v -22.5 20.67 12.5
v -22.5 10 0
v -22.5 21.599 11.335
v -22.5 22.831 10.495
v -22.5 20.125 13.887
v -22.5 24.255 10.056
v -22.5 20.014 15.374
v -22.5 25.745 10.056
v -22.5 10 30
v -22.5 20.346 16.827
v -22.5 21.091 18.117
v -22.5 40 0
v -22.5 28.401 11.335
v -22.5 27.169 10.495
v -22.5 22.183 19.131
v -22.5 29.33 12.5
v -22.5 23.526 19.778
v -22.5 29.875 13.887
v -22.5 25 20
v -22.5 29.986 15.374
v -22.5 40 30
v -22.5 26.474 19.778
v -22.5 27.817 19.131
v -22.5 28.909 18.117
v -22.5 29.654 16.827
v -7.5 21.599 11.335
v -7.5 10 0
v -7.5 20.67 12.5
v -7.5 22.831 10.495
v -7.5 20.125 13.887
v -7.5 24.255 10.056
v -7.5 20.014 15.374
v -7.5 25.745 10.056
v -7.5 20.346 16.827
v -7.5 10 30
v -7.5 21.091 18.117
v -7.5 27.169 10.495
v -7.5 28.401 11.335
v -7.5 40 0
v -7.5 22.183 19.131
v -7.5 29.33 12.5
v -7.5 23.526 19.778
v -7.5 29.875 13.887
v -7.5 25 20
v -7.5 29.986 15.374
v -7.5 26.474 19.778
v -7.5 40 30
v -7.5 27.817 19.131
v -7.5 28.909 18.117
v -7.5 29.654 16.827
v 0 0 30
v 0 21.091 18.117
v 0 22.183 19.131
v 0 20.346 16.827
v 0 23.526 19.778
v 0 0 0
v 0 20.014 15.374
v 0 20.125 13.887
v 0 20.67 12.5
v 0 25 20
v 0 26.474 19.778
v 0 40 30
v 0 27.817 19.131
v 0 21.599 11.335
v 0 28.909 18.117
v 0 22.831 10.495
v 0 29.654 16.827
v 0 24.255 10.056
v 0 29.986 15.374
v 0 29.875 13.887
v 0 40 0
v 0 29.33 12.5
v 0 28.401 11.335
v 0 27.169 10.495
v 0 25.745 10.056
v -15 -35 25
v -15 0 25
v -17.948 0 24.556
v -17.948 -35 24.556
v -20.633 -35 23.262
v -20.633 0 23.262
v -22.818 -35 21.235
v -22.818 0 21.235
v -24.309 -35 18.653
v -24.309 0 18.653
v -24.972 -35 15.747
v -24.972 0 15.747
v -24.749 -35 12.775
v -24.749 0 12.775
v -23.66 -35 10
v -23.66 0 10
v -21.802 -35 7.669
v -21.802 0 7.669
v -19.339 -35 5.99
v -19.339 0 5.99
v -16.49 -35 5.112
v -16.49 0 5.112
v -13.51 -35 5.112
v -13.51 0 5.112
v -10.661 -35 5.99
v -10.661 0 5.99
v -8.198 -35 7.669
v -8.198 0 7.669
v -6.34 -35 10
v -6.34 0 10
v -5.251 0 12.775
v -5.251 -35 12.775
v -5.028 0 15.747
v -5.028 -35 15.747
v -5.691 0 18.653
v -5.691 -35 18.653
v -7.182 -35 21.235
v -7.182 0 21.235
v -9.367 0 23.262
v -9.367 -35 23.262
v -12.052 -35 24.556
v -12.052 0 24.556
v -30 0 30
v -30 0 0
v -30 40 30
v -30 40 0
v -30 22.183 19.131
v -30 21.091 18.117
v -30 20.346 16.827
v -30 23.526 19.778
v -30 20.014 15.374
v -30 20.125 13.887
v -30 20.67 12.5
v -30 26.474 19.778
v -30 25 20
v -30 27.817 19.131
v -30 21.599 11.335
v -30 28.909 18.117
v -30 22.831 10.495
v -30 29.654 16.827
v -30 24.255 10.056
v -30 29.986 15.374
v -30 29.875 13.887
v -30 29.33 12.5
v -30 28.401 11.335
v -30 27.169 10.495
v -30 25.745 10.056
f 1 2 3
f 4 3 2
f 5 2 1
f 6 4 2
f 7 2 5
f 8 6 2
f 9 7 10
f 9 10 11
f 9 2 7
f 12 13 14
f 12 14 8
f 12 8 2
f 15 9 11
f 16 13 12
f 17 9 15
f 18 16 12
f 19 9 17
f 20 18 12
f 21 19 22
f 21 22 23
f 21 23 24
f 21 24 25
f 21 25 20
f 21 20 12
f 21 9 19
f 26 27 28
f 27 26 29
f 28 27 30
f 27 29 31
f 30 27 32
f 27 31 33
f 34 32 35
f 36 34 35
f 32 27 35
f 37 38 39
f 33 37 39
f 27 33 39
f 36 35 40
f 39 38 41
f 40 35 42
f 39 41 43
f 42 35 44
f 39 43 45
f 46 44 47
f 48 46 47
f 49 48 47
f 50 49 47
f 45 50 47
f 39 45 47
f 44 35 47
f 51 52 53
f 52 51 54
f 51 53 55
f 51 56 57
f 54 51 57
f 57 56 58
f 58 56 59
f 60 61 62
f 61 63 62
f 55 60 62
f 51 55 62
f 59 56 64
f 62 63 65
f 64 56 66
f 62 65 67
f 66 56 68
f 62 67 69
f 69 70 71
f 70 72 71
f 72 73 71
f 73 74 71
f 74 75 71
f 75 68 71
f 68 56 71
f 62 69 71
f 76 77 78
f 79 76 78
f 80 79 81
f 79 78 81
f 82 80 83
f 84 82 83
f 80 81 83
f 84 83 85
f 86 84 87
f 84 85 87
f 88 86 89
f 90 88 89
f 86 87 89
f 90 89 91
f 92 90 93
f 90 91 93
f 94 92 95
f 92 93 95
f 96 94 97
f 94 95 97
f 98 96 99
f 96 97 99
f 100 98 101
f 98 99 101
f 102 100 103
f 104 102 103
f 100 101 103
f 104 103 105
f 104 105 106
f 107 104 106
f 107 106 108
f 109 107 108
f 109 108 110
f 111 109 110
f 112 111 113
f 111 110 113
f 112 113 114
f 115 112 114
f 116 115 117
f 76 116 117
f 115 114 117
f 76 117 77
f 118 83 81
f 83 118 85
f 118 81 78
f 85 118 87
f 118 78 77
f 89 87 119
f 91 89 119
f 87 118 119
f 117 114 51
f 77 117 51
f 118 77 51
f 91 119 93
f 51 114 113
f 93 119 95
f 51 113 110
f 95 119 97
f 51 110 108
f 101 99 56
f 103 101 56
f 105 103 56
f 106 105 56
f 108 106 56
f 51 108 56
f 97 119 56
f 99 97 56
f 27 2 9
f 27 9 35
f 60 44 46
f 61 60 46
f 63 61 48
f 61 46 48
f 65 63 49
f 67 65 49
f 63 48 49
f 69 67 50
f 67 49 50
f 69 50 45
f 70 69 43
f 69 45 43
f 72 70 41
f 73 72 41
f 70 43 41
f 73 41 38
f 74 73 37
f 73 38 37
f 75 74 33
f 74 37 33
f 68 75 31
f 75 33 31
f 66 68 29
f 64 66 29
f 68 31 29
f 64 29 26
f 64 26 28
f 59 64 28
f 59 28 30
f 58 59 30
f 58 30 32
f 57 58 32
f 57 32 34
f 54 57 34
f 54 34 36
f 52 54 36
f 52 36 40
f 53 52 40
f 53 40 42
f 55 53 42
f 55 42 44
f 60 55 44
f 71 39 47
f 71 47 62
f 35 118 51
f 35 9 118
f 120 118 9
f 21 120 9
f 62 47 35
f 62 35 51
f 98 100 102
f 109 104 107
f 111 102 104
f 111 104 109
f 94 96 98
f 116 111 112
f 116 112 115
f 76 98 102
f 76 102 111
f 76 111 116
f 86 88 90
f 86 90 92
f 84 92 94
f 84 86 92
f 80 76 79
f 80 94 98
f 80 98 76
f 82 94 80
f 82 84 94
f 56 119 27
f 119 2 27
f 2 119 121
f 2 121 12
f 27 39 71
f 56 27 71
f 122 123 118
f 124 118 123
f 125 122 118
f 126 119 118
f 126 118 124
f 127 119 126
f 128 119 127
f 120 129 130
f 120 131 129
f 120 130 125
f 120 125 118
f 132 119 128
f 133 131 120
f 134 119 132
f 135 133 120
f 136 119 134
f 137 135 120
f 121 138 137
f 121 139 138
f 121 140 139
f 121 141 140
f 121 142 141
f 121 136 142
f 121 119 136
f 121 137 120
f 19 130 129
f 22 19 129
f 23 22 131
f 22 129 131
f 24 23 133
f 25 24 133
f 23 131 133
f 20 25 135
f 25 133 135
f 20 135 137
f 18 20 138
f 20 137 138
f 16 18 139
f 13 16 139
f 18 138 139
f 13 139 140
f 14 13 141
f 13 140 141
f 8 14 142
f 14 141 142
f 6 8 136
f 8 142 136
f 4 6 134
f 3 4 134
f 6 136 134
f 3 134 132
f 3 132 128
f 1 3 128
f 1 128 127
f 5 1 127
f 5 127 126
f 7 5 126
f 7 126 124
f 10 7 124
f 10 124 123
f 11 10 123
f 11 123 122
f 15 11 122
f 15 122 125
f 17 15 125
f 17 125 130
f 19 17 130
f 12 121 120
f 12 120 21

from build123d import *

# Parameters (mm, degrees)
ESQUISSE1_W             = 30
ESQUISSE1_H             = 40
BOSS_EXTRU_1_DEPTH      = 30
ESQUISSE2_W             = 15
ESQUISSE2_H             = 30
ENL_V_MAT_EXTRU_1_DEPTH = 30
ESQUISSE3_R             = 5
ENL_V_MAT_EXTRU_2_DEPTH = 50
ESQUISSE4_R             = 10
BOSS_EXTRU_2_DEPTH      = 35


with BuildPart() as part:
    # Esquisse1 → Boss.-Extru.1 (new body)
    with BuildSketch(Plane.XY):
        with Locations((-15, 20)):
            Rectangle(ESQUISSE1_W, ESQUISSE1_H)
    extrude(amount=BOSS_EXTRU_1_DEPTH)

    # Esquisse2 → Enlèv. mat.-Extru.1 (cut)
    with BuildSketch(Plane.XY.offset(30)):
        with Locations((-15, 25)):
            Rectangle(ESQUISSE2_W, ESQUISSE2_H)
    extrude(amount=-ENL_V_MAT_EXTRU_1_DEPTH, mode=Mode.SUBTRACT)

    # Esquisse3 → Enlèv. mat.-Extru.2 (cut)
    with BuildSketch(Plane.ZY.offset(30)):
        with Locations((15, 25)):
            Circle(ESQUISSE3_R)
    extrude(amount=-ENL_V_MAT_EXTRU_2_DEPTH, mode=Mode.SUBTRACT)

    # Esquisse4 → Boss.-Extru.2 (add)
    with BuildSketch(Plane.XZ):
        with Locations(Location((-15, 15, 0), (0, 0, 90))):  # turned: the seam where the file's is
            Circle(ESQUISSE4_R)
    extrude(amount=BOSS_EXTRU_2_DEPTH)


solid = part.part
